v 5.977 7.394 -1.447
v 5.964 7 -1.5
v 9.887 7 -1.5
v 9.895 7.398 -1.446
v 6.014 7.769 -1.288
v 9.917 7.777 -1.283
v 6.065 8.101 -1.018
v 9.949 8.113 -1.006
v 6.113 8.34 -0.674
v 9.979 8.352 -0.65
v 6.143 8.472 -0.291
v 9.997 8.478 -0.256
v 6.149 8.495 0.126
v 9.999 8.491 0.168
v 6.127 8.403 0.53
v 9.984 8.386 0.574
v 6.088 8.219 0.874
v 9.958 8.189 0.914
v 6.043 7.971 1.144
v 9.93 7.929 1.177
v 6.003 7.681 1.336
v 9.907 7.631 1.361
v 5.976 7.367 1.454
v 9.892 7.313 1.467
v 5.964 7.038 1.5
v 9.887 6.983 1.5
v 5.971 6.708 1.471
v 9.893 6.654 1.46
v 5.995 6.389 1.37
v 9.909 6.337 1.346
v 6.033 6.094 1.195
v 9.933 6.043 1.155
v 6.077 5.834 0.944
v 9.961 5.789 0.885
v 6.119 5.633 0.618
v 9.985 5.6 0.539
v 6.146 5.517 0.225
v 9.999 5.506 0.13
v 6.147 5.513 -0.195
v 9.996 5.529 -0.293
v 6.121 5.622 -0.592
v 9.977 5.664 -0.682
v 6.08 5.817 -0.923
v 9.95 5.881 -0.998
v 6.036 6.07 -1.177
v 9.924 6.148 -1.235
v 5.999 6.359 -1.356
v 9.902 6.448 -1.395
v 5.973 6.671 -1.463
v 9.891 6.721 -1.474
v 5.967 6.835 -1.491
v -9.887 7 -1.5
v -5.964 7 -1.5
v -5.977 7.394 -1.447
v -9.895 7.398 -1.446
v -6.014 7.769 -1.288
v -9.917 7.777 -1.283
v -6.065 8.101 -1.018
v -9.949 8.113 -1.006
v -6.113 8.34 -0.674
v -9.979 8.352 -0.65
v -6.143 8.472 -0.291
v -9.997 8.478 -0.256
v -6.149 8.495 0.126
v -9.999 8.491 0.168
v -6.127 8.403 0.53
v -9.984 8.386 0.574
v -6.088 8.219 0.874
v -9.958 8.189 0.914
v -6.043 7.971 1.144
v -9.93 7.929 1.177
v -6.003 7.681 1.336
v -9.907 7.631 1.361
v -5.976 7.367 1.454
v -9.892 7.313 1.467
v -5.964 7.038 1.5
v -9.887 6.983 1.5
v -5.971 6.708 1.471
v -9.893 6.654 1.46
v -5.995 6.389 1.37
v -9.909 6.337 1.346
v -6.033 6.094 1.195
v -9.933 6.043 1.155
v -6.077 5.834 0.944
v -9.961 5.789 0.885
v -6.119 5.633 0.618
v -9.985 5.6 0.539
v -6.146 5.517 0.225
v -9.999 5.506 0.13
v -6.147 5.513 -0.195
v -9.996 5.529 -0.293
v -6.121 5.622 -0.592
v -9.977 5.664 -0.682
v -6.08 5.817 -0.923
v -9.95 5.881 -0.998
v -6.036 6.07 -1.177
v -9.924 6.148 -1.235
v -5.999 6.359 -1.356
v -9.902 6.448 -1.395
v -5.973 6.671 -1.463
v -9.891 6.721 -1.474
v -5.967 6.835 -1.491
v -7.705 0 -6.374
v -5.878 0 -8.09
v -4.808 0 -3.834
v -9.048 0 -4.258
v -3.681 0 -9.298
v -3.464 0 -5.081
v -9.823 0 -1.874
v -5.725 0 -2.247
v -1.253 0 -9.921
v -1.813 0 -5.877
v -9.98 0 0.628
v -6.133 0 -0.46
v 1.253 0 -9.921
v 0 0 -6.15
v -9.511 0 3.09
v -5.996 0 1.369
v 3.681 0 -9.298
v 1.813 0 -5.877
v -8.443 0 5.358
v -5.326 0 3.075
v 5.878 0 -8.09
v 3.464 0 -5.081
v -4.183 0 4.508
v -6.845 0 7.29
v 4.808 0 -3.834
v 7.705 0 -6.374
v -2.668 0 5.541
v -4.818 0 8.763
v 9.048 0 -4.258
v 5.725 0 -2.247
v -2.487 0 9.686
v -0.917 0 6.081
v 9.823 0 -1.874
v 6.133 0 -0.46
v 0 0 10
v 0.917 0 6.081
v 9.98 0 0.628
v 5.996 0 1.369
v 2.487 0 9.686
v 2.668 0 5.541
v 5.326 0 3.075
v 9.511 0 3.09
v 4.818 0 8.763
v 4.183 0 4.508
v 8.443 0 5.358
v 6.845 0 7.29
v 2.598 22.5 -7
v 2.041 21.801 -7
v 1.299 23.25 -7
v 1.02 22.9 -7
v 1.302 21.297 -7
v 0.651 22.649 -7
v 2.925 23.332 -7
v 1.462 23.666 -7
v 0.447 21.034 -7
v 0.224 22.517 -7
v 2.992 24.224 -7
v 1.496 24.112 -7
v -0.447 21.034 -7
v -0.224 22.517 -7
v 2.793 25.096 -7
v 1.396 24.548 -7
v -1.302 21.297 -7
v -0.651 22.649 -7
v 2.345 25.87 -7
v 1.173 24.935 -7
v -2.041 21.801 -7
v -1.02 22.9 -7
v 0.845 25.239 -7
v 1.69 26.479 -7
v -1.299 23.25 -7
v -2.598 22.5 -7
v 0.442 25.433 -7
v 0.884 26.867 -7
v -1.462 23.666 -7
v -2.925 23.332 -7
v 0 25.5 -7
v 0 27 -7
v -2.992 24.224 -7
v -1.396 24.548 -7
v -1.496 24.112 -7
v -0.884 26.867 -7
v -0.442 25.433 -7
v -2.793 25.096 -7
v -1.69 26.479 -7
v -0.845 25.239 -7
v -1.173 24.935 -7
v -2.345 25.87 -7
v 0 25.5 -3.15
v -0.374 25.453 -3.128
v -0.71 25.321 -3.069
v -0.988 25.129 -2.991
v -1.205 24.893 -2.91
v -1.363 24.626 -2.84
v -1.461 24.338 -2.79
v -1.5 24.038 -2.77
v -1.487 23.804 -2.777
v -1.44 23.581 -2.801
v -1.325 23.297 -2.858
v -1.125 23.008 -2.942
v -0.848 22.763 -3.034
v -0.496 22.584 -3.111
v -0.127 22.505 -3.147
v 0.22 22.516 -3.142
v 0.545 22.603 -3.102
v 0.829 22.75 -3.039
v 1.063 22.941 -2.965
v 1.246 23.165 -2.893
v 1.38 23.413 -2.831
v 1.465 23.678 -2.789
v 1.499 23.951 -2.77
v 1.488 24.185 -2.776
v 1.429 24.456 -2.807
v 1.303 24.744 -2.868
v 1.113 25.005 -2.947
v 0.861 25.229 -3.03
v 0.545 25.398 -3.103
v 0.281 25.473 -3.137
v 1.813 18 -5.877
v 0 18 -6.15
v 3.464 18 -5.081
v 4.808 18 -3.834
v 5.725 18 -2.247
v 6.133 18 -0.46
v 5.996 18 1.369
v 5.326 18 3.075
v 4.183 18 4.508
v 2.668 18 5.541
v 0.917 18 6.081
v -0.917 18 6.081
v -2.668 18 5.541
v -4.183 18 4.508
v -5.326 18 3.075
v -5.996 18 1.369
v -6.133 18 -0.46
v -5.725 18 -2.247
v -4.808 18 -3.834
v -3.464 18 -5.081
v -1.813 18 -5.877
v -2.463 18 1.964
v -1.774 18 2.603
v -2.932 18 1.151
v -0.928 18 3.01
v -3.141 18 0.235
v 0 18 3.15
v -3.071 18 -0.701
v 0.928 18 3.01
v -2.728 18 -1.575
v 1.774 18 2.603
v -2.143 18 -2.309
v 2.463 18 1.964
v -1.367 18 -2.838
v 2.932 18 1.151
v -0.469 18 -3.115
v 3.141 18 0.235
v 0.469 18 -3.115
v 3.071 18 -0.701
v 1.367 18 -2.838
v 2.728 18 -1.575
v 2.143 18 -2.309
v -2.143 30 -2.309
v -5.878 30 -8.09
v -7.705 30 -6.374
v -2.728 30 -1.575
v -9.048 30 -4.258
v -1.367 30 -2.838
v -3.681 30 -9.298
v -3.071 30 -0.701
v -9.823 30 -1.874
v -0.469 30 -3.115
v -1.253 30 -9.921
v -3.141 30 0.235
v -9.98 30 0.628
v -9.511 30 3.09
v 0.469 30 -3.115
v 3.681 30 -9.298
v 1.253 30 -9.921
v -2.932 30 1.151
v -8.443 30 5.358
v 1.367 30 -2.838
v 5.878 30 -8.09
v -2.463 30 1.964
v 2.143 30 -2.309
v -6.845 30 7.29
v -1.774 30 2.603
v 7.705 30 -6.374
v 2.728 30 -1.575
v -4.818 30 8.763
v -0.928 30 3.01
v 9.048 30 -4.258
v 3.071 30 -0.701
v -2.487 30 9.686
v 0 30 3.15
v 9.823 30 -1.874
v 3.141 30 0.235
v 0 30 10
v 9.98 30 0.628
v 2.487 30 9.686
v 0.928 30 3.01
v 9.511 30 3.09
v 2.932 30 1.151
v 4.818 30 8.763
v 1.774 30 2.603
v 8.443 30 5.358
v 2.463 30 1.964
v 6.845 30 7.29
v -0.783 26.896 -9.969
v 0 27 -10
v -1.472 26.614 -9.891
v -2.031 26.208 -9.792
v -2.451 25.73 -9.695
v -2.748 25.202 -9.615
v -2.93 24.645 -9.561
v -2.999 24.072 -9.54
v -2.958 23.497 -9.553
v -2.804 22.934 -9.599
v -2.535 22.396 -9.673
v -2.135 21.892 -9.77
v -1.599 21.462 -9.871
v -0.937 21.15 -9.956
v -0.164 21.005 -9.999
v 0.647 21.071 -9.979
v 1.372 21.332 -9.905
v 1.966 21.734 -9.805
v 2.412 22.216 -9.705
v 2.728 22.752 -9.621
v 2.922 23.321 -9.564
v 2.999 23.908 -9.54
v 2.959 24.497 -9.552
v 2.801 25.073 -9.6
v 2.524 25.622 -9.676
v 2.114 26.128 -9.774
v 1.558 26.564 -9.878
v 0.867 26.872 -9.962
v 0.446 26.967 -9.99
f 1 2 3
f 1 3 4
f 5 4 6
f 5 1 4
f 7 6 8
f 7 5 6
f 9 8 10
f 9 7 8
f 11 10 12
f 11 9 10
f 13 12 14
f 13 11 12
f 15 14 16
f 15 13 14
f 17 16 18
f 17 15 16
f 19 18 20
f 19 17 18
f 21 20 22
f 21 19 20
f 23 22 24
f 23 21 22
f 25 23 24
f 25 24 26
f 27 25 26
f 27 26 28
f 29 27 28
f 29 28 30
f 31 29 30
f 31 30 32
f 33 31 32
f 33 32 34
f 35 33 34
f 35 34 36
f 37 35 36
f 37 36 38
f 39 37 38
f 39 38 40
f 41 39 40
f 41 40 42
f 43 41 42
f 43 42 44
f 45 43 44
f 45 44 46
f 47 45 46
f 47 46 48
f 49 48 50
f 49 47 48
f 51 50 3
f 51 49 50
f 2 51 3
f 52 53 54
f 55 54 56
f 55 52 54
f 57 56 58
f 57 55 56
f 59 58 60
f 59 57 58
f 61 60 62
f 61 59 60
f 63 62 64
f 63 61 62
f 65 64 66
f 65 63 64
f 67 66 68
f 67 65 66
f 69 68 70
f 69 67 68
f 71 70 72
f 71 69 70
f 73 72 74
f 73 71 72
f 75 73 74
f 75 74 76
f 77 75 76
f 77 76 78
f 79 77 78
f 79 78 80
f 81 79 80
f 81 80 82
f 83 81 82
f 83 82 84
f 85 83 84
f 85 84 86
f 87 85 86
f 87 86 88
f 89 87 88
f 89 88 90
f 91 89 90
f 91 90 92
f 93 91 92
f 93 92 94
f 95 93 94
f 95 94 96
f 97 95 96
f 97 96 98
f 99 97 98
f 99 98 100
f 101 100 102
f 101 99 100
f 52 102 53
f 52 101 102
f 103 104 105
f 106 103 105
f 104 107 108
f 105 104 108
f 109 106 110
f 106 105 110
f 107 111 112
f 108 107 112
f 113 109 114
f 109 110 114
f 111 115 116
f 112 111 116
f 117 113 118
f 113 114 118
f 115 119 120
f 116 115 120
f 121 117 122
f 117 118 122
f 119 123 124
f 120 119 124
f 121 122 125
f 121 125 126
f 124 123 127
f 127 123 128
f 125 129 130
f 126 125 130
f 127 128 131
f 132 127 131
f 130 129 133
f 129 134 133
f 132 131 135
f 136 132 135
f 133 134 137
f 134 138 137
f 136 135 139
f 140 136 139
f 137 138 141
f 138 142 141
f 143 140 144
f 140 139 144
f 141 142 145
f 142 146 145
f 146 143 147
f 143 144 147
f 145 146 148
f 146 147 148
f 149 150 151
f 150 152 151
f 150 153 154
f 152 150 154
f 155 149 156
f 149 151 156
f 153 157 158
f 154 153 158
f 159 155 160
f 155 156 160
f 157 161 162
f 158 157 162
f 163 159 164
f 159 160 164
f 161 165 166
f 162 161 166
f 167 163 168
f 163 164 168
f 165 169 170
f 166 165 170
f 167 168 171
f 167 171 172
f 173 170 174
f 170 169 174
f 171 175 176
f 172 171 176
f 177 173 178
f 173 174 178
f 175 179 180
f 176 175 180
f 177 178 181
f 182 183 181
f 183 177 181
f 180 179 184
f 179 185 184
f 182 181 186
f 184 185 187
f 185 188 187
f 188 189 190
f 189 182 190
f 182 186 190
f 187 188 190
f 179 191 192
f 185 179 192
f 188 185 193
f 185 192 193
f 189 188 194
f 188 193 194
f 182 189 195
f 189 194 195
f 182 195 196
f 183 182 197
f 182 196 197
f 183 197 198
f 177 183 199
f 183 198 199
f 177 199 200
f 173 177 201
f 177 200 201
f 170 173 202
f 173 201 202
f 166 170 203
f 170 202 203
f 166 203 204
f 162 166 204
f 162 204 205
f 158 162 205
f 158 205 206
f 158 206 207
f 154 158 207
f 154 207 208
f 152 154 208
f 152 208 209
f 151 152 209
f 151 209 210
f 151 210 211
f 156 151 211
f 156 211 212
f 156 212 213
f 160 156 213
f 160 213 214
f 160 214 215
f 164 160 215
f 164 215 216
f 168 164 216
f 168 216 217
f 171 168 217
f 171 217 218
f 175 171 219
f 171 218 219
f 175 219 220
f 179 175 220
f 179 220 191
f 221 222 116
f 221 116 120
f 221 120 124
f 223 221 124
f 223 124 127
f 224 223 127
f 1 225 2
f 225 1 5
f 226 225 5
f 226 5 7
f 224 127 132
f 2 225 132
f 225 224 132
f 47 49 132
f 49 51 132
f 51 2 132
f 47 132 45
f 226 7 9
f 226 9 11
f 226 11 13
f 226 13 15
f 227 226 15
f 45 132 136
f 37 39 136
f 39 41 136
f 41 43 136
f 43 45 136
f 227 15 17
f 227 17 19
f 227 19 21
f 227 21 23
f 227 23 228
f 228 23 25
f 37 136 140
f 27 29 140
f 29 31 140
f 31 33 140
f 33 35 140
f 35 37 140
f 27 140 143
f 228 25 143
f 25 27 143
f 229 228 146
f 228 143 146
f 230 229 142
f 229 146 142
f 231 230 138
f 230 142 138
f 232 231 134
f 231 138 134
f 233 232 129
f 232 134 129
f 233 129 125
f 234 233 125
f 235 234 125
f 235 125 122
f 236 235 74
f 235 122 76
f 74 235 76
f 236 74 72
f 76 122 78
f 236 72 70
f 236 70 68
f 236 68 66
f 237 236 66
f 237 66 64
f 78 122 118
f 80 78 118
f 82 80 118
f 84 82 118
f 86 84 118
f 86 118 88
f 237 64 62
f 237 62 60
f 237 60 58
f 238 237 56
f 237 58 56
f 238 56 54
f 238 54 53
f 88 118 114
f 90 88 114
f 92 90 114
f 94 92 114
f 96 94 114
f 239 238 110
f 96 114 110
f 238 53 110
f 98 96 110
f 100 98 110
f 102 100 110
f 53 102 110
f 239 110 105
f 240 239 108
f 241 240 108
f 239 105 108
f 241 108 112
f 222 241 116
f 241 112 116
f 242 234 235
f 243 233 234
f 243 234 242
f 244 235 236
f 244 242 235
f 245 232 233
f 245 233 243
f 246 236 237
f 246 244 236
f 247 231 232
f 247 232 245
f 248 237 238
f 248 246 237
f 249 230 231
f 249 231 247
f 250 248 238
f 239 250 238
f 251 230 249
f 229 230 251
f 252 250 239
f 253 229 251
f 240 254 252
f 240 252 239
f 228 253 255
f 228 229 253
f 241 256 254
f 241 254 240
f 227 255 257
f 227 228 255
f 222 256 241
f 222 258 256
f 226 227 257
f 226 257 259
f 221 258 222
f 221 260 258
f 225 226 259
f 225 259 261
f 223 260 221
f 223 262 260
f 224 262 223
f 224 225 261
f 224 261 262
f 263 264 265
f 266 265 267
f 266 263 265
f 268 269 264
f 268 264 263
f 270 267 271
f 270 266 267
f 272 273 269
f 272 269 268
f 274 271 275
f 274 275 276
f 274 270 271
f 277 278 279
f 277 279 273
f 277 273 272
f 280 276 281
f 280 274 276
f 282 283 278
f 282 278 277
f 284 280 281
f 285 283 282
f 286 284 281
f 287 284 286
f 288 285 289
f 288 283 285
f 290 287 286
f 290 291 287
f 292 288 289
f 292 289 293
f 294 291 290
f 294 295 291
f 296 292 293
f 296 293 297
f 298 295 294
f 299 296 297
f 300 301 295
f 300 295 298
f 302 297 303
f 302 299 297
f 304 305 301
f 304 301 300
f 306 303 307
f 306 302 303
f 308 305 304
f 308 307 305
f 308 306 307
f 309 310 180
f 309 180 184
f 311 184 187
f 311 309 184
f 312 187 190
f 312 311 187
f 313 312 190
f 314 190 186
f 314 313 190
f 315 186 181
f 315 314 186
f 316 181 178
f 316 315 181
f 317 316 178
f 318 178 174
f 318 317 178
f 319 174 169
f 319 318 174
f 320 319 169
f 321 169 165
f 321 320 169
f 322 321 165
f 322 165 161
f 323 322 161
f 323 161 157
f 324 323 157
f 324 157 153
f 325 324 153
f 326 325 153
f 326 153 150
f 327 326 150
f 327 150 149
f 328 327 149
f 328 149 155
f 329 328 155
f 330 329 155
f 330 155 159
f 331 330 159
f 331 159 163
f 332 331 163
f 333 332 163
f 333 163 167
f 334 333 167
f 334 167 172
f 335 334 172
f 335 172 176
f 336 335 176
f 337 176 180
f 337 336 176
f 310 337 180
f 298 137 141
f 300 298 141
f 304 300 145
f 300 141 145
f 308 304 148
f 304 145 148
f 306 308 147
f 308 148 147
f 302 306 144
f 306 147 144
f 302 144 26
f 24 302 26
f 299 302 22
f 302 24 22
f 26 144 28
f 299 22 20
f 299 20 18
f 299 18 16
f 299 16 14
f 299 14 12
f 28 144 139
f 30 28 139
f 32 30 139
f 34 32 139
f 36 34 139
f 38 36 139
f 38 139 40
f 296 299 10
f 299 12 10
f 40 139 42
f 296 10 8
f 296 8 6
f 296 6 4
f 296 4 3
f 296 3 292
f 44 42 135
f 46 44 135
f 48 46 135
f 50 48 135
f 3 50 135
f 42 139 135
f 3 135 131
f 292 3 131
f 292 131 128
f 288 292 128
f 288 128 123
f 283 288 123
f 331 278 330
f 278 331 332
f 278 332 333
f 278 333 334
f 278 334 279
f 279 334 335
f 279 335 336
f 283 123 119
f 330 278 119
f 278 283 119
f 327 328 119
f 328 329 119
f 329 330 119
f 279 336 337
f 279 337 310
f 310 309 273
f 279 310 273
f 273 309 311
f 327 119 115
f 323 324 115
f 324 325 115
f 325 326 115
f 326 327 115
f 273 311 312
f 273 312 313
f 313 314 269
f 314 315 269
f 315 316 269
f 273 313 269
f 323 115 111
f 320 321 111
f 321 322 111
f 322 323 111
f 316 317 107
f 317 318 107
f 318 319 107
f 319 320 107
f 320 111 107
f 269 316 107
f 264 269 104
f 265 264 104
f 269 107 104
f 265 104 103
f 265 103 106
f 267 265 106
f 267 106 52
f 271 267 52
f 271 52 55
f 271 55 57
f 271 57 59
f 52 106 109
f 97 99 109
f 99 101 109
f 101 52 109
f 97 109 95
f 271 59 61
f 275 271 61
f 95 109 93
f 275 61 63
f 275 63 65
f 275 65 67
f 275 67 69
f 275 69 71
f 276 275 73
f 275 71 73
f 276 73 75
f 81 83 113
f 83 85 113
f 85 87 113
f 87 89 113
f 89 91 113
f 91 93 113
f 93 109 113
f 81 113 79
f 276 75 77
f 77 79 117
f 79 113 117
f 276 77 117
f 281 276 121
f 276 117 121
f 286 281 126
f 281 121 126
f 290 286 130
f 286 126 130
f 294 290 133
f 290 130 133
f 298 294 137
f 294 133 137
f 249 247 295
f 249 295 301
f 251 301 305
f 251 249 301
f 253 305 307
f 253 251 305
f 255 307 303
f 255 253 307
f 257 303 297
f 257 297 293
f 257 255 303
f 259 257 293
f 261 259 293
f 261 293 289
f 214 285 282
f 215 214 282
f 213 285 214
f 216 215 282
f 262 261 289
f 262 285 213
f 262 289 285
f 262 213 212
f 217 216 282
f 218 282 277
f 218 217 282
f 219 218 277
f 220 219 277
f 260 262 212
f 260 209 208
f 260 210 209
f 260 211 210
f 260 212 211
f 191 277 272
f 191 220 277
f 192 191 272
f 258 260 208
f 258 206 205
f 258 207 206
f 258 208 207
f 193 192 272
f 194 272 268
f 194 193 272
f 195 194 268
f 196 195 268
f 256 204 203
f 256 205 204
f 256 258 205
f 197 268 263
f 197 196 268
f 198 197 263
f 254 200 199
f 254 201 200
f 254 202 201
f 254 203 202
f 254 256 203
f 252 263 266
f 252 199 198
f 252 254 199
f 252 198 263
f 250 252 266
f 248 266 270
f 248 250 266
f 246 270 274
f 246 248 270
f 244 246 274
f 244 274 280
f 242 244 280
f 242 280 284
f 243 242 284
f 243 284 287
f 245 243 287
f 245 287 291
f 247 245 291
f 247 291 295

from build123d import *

# Parameters (mm, degrees)
SKETCH_1_R               = 10
SKETCH_1_R_2             = 3.15
EXTRUDE_1_DEPTH          = 30
CUT_EXTRUDE_1_DEPTH      = 34.166247904
CUT_EXTRUDE_1_DEPTH_BACK = 34.166247904
SKETCH_2_R               = 1.5
SKETCH_3_R               = 1.5
CUT_EXTRUDE_2_DEPTH      = 34.166248063
SKETCH_4_R               = 6.15
CUT_EXTRUDE_3_DEPTH      = 18
CUT_EXTRUDE_START        = -10
SKETCH_5_R               = 3
CUT_EXTRUDE_4_DEPTH      = 3


with BuildPart() as part:
    # 草图1 → 凸台-拉伸1 (new body)
    with BuildSketch(Plane(origin=(0, 0, 0), x_dir=(1, 0, 0), z_dir=(0, 1, 0))):
        with Locations(Location((0, 0, 0), (0, 0, 270))):
            Circle(SKETCH_1_R)
        with Locations(Location((0, 0, 0), (0, 0, 270))):
            Circle(SKETCH_1_R_2, mode=Mode.SUBTRACT)
    extrude(amount=EXTRUDE_1_DEPTH)

    # 草图2 → 切除-拉伸1 (cut, two sides: drawn at the far end of the back side and taken through both)
    with BuildSketch(Plane(origin=(0, 0, 0), x_dir=(0, 0, -1), z_dir=(1, 0, 0)).offset(-CUT_EXTRUDE_1_DEPTH_BACK)):
        with Locations((0, 7)):
            Circle(SKETCH_2_R)
    extrude(amount=CUT_EXTRUDE_1_DEPTH + CUT_EXTRUDE_1_DEPTH_BACK, mode=Mode.SUBTRACT)

    # 草图3 → 切除-拉伸2 (cut, through all)
    with BuildSketch(Plane.XY):
        with Locations(Location((0, 24, 0), (0, 0, 90))):
            Circle(SKETCH_3_R)
    extrude(amount=-CUT_EXTRUDE_2_DEPTH, mode=Mode.SUBTRACT)

    # 草图4 → 切除-拉伸3 (cut)
    with BuildSketch(Plane.XZ):
        with Locations(Location((0, 0, 0), (0, 0, 270))):
            Circle(SKETCH_4_R)
    extrude(amount=-CUT_EXTRUDE_3_DEPTH, mode=Mode.SUBTRACT)

    # 草图5 → 切除-拉伸4 (cut)
    with BuildSketch(Plane.XY.offset(CUT_EXTRUDE_START)):
        with Locations(Location((0, 24, 0), (0, 0, 90))):
            Circle(SKETCH_5_R)
    extrude(amount=CUT_EXTRUDE_4_DEPTH, mode=Mode.SUBTRACT)


solid = part.part
